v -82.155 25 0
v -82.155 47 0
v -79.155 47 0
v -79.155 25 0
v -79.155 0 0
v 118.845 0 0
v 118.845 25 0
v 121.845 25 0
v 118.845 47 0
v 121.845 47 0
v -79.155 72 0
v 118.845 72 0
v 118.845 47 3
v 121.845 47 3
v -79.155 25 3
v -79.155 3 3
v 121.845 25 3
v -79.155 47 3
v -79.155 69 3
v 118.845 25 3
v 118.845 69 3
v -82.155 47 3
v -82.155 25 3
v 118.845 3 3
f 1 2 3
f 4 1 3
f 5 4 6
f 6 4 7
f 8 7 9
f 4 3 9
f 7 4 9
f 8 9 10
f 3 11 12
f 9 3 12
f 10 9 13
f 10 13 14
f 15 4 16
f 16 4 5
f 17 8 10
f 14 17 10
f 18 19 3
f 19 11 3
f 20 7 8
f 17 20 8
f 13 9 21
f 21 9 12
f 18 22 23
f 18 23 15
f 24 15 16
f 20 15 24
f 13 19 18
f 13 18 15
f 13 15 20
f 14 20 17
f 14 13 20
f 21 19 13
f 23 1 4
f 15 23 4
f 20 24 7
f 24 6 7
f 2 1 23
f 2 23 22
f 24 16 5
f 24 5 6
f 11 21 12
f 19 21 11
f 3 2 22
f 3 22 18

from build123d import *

# Parameters (mm, degrees)
F0_W     = 3
F0_H     = 22
F1_DEPTH = 3
F2_SIZE  = 2.99999


# Not quite as in the source:
# - a fillet or chamfer is up to 0.001 mm smaller than in the source, because OpenCascade refuses the exact size


with BuildPart() as f1:
    # F0 (on Top) → F1 (new body)
    with BuildSketch(Plane.XY):
        Polygon((-79.1548952963, 25), (-79.1548952963, 0), (118.8451047037, 0), (118.8451047037, 25), (118.8451047037, 47), (118.8451047037, 72), (-79.1548952963, 72), (-79.1548952963, 47), align=None)
        with Locations((120.3451047037, 36)):
            Rectangle(F0_W, F0_H)
        with Locations((-80.6548952963, 36)):
            Rectangle(F0_W, F0_H)
    extrude(amount=F1_DEPTH)

    # F2 (size 3 in the source; OpenCascade refuses exactly that, so slightly less here)
    f2_edges = [f1.edges().sort_by_distance(p)[0] for p in [
        (19.845105, 0, 3),
        (19.845105, 72, 3),
    ]]
    chamfer(f2_edges, length=F2_SIZE)


solid = f1.part
